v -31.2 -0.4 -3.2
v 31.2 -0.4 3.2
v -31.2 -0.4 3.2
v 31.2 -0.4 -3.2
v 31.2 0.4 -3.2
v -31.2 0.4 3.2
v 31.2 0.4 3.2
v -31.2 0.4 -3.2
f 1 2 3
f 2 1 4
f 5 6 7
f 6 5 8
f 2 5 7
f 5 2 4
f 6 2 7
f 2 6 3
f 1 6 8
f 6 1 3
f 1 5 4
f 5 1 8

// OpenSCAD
// file: ../p/box.scad
use <../lib.scad>
function ldraw_lib__box() = [
// 0 Box 6 (six faces)
// 0 Name: box.dat
// 0 Author: James Jessiman
// 0 !LDRAW_ORG Primitive UPDATE 2002-05
// 0 !LICENSE Licensed under CC BY 2.0 and CC BY 4.0 : see CAreadme.txt
// 
// 0 BFC CERTIFY CCW
  [0,"BFC","CERTIFY"],
  [0,"BFC","CCW"],
// 
// 0 !HISTORY 2002-08-22 [sbliss] Applied BFC
// 0 !HISTORY 2002-11-30 [PTadmin] Official Update 2002-05
// 0 !HISTORY 2007-06-24 [PTadmin] Header formatted for Contributor Agreement
// 0 !HISTORY 2008-07-01 [PTadmin] Official Update 2008-01
// 
// 
// 2 24 1 1 1 -1 1 1
  [2,24,1,1,1,-1,1,1],
// 2 24 -1 1 1 -1 1 -1
  [2,24,-1,1,1,-1,1,-1],
// 2 24 -1 1 -1 1 1 -1
  [2,24,-1,1,-1,1,1,-1],
// 2 24 1 1 -1 1 1 1
  [2,24,1,1,-1,1,1,1],
// 2 24 1 -1 1 -1 -1 1
  [2,24,1,-1,1,-1,-1,1],
// 2 24 -1 -1 1 -1 -1 -1
  [2,24,-1,-1,1,-1,-1,-1],
// 2 24 -1 -1 -1 1 -1 -1
  [2,24,-1,-1,-1,1,-1,-1],
// 2 24 1 -1 -1 1 -1 1
  [2,24,1,-1,-1,1,-1,1],
// 2 24 1 -1 1 1 1 1
  [2,24,1,-1,1,1,1,1],
// 2 24 -1 -1 1 -1 1 1
  [2,24,-1,-1,1,-1,1,1],
// 2 24 1 -1 -1 1 1 -1
  [2,24,1,-1,-1,1,1,-1],
// 2 24 -1 -1 -1 -1 1 -1
  [2,24,-1,-1,-1,-1,1,-1],
// 4 16 1 1 1 1 1 -1 -1 1 -1 -1 1 1
  [4,16,1,1,1,1,1,-1,-1,1,-1,-1,1,1],
// 4 16 -1 -1 -1 1 -1 -1 1 -1 1 -1 -1 1
  [4,16,-1,-1,-1,1,-1,-1,1,-1,1,-1,-1,1],
// 4 16 -1 -1 1 1 -1 1 1 1 1 -1 1 1
  [4,16,-1,-1,1,1,-1,1,1,1,1,-1,1,1],
// 4 16 -1 -1 -1 -1 -1 1 -1 1 1 -1 1 -1
  [4,16,-1,-1,-1,-1,-1,1,-1,1,1,-1,1,-1],
// 4 16 1 -1 -1 -1 -1 -1 -1 1 -1 1 1 -1
  [4,16,1,-1,-1,-1,-1,-1,-1,1,-1,1,1,-1],
// 4 16 1 -1 1 1 -1 -1 1 1 -1 1 1 1
  [4,16,1,-1,1,1,-1,-1,1,1,-1,1,1,1],
// 0
];
module ldraw_lib__box(step=0, col=false, unit=2/5, alt=false, line=0.2, solid=!$preview)
    makepoly(ldraw_lib__box(), step=step, col=col, unit=unit, alt=alt, line=line, solid=solid);
ldraw_lib__box(line=0.2);
// file: 2499.scad
use <../lib.scad>
use <../p/box.scad>
function ldraw_lib__2499() = [
// 0 ~Electric Light & Sound Brick  1 x  8 with 3 Light Holes Lid
// 0 Name: 2499.dat
// 0 Author: Chris Dee [cwdee]
// 0 !LDRAW_ORG Part UPDATE 2020-03
// 0 !LICENSE Licensed under CC BY 2.0 and CC BY 4.0 : see CAreadme.txt
// 
// 0 BFC CERTIFY CCW
  [0,"BFC","CERTIFY"],
  [0,"BFC","CCW"],
// 
// 0 !HISTORY 2011-12-29 [PTadmin] Official Update 2011-02
// 0 !HISTORY 2020-07-20 [PTadmin] Renamed from u9042
// 0 !HISTORY 2020-12-29 [PTadmin] Official Update 2020-03
// 
// 
// 1 16 0 0 0 0 0 78 8 0 0 0 -1 0 box.dat
  [1,16,0,0,0,0,0,78,8,0,0,0,-1,0, ldraw_lib__box()],
// 0
];
module ldraw_lib__2499(step=0, col=false, unit=2/5, alt=false, line=0.2, solid=!$preview)
    makepoly(ldraw_lib__2499(), step=step, col=col, unit=unit, alt=alt, line=line, solid=solid);
ldraw_lib__2499(line=0.2);
// main file
use <../lib.scad>
use <2499.scad>
function ldraw_lib__u9042() = [
// 0 ~Moved to 2499
// 0 Name: u9042.dat
// 0 Author: [PTadmin]
// 0 !LDRAW_ORG Part UPDATE 2020-03
// 0 !LICENSE Licensed under CC BY 4.0 : see CAreadme.txt
// 
// 0 BFC CERTIFY CCW
  [0,"BFC","CERTIFY"],
  [0,"BFC","CCW"],
// 
// 0 !HISTORY 2020-12-29 [PTadmin] Official Update 2020-03
// 
// 
// 0 // ~Electric Light & Sound Brick 1 x 8 with 3 Light Holes Lid
// 1 16 0 0 0 1 0 0 0 1 0 0 0 1 2499.dat
  [1,16,0,0,0,1,0,0,0,1,0,0,0,1, ldraw_lib__2499()],
];
module ldraw_lib__u9042(step=0, col=false, unit=2/5, alt=false, line=0.2, solid=!$preview)
    makepoly(ldraw_lib__u9042(), step=step, col=col, unit=unit, alt=alt, line=line, solid=solid);
ldraw_lib__u9042(line=0.2);
